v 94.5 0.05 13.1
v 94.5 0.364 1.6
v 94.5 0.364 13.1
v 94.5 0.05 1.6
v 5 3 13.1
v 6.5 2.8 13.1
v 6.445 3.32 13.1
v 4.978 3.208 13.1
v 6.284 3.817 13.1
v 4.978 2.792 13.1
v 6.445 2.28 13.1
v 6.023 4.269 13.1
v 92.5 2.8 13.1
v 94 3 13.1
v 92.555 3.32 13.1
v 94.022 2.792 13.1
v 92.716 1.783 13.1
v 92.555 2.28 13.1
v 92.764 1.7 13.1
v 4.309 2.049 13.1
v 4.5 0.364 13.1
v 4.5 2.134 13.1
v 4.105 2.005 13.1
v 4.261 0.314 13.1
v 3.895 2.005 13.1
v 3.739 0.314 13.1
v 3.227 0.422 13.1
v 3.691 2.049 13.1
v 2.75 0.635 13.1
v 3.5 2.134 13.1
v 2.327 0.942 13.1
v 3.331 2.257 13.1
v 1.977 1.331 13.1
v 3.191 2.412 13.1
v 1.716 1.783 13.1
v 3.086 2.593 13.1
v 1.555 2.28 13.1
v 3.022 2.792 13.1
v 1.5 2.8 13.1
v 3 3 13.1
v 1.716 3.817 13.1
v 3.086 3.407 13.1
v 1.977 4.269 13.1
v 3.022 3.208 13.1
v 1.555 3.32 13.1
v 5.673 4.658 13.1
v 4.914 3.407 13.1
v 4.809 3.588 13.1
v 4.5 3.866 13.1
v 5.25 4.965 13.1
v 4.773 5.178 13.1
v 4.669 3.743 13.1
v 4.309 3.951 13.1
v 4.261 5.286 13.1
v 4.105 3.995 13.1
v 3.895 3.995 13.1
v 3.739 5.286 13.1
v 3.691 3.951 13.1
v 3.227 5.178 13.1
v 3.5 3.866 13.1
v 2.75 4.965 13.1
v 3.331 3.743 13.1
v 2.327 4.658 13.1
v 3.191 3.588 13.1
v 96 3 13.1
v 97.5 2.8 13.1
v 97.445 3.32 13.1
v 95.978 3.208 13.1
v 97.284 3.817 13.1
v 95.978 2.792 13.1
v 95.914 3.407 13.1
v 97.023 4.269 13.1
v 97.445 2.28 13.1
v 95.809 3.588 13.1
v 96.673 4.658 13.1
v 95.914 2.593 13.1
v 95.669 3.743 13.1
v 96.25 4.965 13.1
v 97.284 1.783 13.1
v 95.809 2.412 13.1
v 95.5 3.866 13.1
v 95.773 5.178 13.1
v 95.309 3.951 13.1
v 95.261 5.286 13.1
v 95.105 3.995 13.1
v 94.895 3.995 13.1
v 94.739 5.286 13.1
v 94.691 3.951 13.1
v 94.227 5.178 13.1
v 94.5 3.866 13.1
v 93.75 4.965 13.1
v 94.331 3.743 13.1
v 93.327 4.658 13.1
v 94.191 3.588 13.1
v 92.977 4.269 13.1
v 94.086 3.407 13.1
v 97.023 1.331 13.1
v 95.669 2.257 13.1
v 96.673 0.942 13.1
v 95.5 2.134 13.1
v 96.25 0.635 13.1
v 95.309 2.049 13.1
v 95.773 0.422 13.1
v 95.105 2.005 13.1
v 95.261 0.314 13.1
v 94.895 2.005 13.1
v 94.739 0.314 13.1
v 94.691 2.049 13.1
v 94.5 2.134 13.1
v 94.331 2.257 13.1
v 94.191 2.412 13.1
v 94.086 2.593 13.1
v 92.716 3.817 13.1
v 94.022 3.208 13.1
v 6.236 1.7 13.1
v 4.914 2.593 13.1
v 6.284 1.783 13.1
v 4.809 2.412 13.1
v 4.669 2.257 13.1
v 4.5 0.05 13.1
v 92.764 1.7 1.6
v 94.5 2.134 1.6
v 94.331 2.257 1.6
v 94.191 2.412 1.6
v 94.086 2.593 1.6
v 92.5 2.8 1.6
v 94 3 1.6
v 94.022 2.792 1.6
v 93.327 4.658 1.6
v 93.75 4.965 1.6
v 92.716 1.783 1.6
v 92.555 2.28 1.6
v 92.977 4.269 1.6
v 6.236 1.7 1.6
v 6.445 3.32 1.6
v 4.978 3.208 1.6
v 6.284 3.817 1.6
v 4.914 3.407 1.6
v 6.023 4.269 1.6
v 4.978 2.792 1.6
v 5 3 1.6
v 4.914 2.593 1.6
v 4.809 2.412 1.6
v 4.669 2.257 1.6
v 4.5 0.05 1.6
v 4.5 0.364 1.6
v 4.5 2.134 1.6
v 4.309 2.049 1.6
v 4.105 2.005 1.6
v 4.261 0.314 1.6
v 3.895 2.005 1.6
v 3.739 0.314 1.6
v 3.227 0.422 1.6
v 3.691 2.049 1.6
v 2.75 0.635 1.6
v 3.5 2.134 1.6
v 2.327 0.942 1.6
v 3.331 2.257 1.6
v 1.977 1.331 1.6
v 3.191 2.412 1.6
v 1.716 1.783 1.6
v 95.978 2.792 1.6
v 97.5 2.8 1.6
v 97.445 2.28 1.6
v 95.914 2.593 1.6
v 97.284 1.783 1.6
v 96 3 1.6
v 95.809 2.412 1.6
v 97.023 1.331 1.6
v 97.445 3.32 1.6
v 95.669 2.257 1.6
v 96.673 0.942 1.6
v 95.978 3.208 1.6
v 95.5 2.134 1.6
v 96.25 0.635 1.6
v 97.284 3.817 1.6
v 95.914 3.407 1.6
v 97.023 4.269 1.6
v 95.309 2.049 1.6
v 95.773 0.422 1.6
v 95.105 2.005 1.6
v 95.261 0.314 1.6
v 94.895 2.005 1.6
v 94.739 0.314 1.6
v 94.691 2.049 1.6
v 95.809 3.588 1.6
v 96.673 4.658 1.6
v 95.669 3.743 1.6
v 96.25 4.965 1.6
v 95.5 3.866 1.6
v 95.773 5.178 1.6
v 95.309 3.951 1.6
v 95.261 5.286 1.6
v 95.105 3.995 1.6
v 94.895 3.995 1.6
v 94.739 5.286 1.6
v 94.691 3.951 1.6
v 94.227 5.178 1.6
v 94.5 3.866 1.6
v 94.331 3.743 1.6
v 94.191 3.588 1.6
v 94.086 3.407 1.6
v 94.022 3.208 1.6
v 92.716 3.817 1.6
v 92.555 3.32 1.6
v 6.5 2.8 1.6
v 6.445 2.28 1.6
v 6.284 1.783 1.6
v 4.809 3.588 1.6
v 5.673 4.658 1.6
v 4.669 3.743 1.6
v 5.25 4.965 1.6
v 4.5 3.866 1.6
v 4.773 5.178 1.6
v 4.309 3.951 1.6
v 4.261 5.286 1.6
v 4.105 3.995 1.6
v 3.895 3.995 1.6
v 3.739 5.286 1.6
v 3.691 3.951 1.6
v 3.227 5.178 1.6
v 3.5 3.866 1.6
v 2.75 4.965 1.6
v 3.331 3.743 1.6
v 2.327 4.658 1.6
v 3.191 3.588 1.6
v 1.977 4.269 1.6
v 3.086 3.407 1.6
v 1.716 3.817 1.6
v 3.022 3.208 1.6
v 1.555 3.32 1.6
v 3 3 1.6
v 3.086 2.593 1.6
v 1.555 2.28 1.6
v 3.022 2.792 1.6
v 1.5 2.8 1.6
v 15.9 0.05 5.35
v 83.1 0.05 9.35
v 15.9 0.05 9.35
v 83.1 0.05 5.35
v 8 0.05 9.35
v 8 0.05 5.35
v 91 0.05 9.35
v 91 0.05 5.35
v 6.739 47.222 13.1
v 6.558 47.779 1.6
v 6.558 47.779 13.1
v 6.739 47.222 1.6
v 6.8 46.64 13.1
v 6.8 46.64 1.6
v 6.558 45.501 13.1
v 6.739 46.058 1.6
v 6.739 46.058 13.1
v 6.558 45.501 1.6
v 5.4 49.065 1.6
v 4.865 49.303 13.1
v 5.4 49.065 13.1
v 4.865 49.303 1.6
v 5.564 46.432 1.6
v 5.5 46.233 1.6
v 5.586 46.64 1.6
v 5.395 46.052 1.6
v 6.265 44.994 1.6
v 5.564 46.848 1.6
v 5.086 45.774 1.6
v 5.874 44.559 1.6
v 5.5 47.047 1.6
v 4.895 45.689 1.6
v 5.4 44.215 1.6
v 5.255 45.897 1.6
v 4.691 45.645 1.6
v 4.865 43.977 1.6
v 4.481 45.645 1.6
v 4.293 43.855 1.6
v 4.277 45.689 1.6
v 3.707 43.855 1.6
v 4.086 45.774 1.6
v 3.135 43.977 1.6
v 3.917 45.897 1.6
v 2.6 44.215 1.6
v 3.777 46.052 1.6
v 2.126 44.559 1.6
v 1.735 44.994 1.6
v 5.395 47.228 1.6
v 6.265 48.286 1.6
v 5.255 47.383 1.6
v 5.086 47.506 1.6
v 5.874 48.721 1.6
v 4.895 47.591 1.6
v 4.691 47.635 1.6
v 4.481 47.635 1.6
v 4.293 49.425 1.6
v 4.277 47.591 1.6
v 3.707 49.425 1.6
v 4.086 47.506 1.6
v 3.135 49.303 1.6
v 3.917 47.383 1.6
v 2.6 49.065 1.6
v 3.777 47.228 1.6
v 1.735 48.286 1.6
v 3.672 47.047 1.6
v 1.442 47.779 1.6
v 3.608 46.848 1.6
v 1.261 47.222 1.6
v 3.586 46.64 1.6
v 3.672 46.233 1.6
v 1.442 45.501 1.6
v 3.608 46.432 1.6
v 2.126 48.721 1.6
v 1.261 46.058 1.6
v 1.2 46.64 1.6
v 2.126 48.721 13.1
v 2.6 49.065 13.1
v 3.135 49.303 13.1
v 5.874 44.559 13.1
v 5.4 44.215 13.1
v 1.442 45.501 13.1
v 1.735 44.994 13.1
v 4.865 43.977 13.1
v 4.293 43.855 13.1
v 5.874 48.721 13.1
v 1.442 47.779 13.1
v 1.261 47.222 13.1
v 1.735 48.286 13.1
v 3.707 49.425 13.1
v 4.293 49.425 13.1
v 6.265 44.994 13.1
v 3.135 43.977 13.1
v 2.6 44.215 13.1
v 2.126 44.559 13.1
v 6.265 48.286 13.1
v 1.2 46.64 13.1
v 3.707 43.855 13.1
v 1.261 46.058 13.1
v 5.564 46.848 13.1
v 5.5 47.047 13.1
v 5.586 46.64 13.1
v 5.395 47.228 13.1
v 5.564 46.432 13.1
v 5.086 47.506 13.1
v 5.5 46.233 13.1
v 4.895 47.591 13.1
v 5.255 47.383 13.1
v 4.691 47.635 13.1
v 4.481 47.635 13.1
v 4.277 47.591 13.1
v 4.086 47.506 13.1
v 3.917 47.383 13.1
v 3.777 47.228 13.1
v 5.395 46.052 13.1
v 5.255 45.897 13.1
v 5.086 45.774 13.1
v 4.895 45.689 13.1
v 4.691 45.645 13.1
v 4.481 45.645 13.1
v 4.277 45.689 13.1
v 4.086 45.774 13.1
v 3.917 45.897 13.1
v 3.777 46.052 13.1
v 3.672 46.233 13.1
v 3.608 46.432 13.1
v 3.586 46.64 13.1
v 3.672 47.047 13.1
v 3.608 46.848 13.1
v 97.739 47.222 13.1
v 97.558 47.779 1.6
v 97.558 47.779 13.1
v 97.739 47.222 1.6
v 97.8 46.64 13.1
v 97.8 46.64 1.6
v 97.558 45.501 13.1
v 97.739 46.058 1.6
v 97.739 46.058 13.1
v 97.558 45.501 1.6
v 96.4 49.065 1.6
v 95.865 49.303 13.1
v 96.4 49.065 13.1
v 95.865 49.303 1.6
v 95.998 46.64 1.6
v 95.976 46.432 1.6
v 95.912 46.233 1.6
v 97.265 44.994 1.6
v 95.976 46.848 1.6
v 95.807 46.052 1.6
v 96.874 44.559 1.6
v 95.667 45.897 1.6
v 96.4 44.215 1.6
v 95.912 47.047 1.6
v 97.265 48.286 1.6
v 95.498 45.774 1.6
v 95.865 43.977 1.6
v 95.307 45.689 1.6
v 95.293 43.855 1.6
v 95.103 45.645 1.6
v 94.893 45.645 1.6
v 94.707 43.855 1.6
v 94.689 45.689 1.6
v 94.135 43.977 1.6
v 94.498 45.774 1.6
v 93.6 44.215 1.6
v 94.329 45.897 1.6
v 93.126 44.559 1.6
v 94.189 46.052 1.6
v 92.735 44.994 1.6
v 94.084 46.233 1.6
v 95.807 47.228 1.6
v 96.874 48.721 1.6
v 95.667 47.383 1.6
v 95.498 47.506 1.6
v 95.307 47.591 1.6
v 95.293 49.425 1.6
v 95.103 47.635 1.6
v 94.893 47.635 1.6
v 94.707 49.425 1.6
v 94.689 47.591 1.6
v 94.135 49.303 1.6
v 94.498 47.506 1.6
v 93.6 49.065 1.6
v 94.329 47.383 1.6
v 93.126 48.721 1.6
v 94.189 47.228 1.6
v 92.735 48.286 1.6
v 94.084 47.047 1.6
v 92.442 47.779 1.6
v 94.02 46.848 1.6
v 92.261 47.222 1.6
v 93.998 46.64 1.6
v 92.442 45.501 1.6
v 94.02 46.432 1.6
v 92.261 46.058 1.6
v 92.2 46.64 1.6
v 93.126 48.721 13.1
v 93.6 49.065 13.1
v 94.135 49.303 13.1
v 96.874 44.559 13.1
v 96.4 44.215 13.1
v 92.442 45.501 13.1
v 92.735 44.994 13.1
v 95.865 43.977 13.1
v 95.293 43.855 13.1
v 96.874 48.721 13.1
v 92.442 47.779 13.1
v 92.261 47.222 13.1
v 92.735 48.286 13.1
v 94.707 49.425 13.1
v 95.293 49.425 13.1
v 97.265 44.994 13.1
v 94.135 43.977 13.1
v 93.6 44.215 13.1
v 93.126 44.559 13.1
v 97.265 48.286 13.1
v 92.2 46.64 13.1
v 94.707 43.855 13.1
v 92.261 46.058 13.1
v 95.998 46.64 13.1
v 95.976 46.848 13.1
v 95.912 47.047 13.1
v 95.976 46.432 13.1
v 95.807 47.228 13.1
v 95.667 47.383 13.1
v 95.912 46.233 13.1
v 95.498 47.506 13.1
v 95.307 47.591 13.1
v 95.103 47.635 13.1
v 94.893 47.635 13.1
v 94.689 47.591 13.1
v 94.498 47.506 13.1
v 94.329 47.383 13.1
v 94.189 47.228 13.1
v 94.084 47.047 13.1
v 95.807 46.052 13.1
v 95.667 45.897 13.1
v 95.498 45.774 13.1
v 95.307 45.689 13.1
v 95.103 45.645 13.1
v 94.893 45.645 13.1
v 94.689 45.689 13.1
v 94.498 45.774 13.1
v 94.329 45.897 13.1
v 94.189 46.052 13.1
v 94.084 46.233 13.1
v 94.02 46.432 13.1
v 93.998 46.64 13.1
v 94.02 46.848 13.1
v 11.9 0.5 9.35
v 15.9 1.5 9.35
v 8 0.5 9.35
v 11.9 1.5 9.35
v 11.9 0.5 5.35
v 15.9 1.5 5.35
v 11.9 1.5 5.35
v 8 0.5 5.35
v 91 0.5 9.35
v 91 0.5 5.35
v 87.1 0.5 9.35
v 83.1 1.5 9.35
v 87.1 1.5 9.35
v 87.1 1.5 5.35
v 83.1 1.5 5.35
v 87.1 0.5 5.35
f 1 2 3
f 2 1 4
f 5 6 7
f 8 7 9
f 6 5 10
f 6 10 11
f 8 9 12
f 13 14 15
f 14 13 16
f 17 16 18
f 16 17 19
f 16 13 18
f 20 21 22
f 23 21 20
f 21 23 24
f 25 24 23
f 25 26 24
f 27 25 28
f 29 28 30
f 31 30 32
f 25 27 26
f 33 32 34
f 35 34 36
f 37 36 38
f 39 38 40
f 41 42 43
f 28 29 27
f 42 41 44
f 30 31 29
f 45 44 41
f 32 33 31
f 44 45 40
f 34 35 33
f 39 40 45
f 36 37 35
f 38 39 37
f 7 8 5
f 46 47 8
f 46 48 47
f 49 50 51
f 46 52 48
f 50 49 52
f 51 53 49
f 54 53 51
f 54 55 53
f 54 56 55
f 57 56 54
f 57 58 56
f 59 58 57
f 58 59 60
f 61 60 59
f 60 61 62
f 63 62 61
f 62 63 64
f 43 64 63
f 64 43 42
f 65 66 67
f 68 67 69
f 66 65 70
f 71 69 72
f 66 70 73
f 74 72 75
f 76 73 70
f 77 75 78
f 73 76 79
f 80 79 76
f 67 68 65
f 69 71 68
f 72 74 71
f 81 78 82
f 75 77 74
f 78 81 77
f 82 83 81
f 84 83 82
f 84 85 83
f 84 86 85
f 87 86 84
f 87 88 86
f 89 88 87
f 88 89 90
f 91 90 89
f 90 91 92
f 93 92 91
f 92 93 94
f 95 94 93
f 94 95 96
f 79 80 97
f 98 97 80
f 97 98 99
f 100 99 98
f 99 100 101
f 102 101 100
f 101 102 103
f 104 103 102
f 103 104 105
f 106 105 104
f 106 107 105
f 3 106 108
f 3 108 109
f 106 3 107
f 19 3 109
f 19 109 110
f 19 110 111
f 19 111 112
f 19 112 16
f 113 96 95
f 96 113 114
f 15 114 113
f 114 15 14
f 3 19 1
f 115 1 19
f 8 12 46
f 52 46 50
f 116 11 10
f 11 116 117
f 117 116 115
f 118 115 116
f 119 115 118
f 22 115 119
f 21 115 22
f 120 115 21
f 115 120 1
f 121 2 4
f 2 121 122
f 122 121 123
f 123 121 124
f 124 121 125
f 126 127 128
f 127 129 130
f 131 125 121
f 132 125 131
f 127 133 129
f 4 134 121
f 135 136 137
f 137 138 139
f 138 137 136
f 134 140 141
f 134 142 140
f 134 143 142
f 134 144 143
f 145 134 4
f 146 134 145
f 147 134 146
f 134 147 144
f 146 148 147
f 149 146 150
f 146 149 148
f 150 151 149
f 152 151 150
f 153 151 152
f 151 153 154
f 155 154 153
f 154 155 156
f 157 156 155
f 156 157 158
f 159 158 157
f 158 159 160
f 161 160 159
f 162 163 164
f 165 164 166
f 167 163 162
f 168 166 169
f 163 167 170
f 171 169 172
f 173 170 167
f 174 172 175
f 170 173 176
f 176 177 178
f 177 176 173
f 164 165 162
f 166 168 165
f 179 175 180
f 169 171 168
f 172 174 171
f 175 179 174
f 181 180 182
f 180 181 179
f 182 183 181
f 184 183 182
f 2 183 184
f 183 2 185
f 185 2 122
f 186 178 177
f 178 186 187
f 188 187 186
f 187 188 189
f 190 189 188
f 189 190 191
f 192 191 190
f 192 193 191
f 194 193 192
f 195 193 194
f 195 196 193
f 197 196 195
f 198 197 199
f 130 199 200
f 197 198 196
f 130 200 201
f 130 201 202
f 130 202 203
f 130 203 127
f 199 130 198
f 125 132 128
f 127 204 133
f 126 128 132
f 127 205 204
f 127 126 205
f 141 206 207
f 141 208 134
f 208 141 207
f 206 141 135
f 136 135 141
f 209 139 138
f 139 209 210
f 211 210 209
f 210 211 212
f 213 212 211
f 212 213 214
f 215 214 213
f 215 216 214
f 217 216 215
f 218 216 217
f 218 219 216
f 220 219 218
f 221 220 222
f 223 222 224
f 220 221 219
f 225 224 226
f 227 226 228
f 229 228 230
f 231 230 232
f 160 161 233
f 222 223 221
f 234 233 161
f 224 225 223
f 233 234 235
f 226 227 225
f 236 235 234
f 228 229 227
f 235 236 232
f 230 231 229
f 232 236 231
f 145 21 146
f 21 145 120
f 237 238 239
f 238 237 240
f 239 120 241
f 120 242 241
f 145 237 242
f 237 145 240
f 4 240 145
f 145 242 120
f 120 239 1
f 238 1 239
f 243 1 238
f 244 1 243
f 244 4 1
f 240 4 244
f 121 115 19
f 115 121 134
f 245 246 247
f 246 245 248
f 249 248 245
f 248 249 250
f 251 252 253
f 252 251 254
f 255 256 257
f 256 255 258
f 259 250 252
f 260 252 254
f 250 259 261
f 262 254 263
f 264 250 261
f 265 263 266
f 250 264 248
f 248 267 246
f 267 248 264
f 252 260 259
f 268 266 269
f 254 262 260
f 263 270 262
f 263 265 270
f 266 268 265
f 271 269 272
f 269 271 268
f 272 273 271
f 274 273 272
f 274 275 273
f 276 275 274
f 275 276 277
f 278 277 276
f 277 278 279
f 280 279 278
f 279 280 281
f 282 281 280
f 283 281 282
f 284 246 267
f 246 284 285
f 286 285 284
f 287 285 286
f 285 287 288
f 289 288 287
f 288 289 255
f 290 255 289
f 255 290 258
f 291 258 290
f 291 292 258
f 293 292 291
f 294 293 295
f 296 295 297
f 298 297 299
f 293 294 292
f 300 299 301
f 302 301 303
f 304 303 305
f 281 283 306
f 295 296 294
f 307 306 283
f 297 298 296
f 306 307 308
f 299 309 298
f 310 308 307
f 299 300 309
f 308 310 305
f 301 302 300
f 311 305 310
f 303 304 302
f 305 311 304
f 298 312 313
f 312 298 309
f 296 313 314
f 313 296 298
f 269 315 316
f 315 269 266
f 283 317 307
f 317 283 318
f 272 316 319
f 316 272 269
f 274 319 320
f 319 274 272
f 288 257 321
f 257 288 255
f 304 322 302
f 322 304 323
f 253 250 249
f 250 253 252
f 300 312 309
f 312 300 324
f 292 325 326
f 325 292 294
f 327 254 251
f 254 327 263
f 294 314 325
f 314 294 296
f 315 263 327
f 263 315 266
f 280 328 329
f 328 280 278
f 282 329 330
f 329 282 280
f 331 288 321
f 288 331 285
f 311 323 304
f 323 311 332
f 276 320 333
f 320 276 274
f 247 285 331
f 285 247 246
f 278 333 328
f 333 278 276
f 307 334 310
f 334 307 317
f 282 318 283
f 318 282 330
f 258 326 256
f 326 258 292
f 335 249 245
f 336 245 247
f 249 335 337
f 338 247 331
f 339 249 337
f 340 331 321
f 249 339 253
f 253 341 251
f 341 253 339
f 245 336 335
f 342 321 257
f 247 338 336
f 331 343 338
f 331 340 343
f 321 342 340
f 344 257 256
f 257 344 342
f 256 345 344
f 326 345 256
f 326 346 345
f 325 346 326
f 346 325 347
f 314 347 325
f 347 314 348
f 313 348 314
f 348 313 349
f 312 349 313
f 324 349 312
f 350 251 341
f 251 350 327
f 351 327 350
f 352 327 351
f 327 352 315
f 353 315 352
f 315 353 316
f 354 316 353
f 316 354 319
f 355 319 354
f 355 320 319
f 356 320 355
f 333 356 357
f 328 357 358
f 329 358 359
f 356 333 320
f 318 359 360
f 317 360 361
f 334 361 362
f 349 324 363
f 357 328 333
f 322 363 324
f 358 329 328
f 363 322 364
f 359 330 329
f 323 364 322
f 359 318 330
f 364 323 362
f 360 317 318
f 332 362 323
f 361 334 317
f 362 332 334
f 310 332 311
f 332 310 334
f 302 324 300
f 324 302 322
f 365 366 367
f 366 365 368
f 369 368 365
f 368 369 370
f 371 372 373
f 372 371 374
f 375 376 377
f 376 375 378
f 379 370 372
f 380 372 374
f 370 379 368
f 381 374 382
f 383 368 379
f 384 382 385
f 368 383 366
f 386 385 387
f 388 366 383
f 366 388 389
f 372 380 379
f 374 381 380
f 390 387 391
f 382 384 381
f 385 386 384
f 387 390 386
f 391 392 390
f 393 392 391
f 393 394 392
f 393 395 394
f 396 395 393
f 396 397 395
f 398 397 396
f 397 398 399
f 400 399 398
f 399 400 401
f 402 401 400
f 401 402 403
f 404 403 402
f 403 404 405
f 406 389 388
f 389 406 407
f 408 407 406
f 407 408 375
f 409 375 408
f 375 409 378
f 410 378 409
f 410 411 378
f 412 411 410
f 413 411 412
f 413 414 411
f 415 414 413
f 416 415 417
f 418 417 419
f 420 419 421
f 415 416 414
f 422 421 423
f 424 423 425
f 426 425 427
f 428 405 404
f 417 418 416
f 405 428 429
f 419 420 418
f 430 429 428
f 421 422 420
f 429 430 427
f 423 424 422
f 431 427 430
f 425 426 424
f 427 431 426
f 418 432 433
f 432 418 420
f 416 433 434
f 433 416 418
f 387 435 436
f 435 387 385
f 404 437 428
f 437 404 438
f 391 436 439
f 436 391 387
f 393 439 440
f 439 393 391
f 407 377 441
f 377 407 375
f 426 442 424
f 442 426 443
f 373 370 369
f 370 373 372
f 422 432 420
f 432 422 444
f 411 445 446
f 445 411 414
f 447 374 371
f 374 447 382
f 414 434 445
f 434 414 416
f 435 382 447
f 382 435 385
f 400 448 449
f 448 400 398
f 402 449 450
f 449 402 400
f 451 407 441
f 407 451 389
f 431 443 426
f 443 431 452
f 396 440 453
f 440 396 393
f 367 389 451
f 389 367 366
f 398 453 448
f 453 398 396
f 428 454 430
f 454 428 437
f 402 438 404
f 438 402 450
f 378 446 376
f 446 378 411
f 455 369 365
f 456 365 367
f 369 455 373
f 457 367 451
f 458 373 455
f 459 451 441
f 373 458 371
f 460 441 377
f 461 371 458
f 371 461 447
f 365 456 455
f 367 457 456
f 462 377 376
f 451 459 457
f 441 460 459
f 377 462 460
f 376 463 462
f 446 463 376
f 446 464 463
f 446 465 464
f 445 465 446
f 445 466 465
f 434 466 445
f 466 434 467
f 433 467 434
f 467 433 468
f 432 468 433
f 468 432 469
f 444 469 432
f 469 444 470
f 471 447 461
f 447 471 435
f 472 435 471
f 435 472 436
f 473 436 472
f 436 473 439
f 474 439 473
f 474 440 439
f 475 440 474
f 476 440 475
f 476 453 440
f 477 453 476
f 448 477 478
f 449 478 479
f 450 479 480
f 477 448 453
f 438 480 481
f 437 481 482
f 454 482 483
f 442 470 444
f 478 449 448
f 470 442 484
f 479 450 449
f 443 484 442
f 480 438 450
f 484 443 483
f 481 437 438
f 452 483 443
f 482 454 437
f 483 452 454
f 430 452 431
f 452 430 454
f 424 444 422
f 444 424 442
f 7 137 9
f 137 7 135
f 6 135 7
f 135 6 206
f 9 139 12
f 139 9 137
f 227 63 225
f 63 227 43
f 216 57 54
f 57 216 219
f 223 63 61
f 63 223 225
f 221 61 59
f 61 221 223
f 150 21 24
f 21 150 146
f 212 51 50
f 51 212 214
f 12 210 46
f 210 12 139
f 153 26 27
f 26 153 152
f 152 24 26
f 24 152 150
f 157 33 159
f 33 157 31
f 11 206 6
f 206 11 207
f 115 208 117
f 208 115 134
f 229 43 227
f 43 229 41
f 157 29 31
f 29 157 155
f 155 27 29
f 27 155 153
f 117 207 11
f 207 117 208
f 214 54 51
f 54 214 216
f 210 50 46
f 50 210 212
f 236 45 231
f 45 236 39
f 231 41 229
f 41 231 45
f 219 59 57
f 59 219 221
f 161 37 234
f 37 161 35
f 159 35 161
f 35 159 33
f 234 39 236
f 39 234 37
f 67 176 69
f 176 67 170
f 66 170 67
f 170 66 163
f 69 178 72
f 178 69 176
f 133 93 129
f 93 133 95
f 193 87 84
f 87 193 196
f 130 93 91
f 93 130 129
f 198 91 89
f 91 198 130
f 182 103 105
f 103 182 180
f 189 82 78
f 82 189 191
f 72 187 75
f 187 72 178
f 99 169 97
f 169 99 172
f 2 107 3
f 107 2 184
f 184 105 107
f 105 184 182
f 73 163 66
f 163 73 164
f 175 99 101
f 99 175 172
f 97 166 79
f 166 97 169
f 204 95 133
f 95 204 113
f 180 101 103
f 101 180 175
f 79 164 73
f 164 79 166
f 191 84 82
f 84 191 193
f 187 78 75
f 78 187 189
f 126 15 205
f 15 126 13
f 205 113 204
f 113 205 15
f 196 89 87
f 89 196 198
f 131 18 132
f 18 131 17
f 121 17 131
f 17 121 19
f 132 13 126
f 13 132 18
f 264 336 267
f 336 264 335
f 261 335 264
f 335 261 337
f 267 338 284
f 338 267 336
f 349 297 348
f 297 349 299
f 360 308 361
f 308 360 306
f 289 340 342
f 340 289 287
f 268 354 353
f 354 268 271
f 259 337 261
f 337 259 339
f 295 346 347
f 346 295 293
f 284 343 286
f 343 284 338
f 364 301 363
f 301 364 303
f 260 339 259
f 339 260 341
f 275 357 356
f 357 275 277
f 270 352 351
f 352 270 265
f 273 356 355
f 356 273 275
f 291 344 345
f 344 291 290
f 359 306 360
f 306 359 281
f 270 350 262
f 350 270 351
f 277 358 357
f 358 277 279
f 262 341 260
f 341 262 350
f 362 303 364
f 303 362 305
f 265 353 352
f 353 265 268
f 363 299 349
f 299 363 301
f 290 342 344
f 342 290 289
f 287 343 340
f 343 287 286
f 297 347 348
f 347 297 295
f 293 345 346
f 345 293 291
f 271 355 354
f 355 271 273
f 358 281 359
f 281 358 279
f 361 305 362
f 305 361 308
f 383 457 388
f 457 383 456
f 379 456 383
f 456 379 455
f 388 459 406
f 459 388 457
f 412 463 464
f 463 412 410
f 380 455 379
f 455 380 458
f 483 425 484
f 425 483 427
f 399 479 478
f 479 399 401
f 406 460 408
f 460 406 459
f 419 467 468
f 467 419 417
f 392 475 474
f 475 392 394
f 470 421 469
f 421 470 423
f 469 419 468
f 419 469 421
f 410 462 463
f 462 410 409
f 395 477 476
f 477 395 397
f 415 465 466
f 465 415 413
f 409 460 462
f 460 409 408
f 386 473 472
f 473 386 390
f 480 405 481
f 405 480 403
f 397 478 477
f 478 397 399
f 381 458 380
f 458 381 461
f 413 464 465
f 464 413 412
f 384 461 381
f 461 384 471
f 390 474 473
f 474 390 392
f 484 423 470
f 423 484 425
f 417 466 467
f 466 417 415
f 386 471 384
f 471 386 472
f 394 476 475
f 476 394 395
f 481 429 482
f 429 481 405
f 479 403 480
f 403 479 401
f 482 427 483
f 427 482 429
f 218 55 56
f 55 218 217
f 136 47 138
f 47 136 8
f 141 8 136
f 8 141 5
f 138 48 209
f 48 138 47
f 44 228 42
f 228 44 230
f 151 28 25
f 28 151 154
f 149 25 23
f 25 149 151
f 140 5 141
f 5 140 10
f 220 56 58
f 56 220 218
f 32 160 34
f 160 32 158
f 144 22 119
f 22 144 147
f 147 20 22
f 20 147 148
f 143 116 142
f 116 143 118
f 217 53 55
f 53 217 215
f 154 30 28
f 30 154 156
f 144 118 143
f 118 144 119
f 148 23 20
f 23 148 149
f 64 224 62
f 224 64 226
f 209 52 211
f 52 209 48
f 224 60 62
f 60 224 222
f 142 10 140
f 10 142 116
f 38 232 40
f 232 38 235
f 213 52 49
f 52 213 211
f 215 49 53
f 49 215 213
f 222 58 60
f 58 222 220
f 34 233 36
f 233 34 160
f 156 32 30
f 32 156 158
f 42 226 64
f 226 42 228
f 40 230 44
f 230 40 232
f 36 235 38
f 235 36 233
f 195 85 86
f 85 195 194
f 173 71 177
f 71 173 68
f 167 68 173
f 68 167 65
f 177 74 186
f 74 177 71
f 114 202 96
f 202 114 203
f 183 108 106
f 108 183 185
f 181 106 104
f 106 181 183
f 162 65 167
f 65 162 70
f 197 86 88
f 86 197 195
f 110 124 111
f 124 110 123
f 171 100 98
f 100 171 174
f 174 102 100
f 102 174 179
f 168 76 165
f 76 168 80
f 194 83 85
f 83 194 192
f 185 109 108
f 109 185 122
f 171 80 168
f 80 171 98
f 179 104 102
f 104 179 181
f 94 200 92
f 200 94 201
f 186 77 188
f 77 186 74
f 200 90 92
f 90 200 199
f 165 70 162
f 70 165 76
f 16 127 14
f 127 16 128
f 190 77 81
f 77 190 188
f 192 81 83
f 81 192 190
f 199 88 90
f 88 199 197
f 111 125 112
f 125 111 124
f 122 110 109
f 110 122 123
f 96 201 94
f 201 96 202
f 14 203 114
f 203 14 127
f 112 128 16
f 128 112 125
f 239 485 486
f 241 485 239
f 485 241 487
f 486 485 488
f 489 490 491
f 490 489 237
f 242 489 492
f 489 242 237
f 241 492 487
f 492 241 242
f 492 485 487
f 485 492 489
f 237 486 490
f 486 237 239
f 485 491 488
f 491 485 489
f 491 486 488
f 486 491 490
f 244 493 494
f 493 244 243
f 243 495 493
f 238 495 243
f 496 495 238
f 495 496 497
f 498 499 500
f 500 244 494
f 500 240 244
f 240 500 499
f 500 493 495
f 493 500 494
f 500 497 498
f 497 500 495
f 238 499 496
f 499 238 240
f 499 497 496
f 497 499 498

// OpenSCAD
////// MixTape 3d Printed Case///////////////////////////

// thanks for adding the wall thickness, Philip!

// 

plugHeight = 10.6; // [6:11]
tapeHeight = 11.5; //
topThickness = 1.6; 
screwHoleSize = 1;

bottom_wall_thickness = 2;

usb_charger = false;
cutout_aux_ports = false;

//rotate([55,0,$t*380]) translate([-50,0,0]){
rotate([0,0,0]) translate([0,0,0]){
//PCB();
//parts();

difference(){
    
    union(){
        //tapeBody();
        //tapeTop();
        FullCase();
    }
    
    // Plugs 
    translate([2.5,50,tapeHeight-plugHeight+topThickness]) cube([13,20,plugHeight+1],false); 
    translate([83.5,50,tapeHeight-plugHeight+topThickness]) cube([13,20,plugHeight+1],false);
    
    // write protectors 
    translate([10,0,0.5*tapeHeight+1.6]) cube([4,1,4],true);
    translate([13.9,0,0.5*tapeHeight+1.6]) cube([4,3,4],true);
    translate([89,0,0.5*tapeHeight+1.6]) cube([4,1,4],true);
    translate([85.1,0,0.5*tapeHeight+1.6]) cube([4,3,4],true);

    // Power signs
    //if (!usb_charger) {
    //    translate([41,0,0.5*tapeHeight+1.6]) cube([4,1.5,1],true);
    //    translate([41,0,0.5*tapeHeight+1.6]) cube([1,1.5,4],true);
    
    //    translate([58,0,0.5*tapeHeight+1.6]) cube([4,1.5,1],true); 
    //}
}
}


module FullCase(){
    
    difference(){
        tapeBody();
        screwHolebtop();
        screwHolebottom();
        speakerHole();
    }
    
    difference(){
        tapeTop();
        screwHolebtopcover();
        screwHolebtop();
        screwHolebottom();
    }    
   


// Modules ///////////////////////////////


module speakerHole(){   
    translate([0,18,tapeHeight/2 + topThickness])    
    for(z=[-180:45:+180])
      for(x=[4:3:12])
        rotate([90,z,90]) translate([x*0.45,0,0]) cylinder(h=10, r=0.4, $fn=30);
}
    
}


// Modules ///////////////////////////////

module PCB(){
color("DarkKhaki") 
translate ([0,0,tapeHeight+1.6]) linear_extrude(height = 1.6, center = false, convexity = 10, twist = 0) import("mixtape_case_3D_bottom.dxf", convexity=3);
color("Gold") 
translate ([0,0,tapeHeight+3.2]) linear_extrude(height = 0.2, center = false, convexity = 10, twist = 0) import("mixtape_case_3D_PCB.dxf", convexity=3);

color("DarkKhaki") 
translate ([0,0,tapeHeight+2*topThickness]) linear_extrude(height = 1.6, center = false, convexity = 10, twist = 0) import("mixtape_case_3D_PCB_TrapezBoard.dxf", convexity=3);
color("Gold") 
translate ([0,0,tapeHeight+3*topThickness]) linear_extrude(height = 0.2, center = false, convexity = 10, twist = 0) import("mixtape_case_3D_PCB_TrapezCircuit.dxf", convexity=3);
}

module tapeBody(){ 
    difference(){
        union(){
            difference(){ 
                //color("Deeppink") 
                translate ([0,0,1.6]) linear_extrude(height = tapeHeight, center = false, convexity = 10, twist = 0) import("mixtape_case_3D_bottom.dxf", convexity=3);  

                //if (!usb_charger) {
                    //translate ([0,0,0.6]) linear_extrude(height = tapeHeight+4, center = false, convexity = 10, twist = 0) import("mixtape_case_3D_MainCase.dxf", convexity=3);
                //} else {
                    //translate ([0,0,0.6]) linear_extrude(height = tapeHeight+4, center = false, convexity = 10, twist = 0) import("mixtape_case_3D_MainCase_USB.dxf", convexity=3);
                //}
      
                //Face holes
                translate([25,64,0.5*tapeHeight+topThickness]) cube([12,2,0.7*tapeHeight],true);
                if (!usb_charger) { 
                    translate([49.5,64,0.5*tapeHeight+topThickness]) cube([16,2,0.7*tapeHeight],true); 
                }
                translate([74.3,64,0.5*tapeHeight+topThickness]) cube([12,2,0.7*tapeHeight],true);

                translate([36,65,0.5*tapeHeight+topThickness]) cube([4,2,0.7*tapeHeight],true);
                translate([63,65,0.5*tapeHeight+topThickness]) cube([4,2,0.7*tapeHeight],true);

                if (usb_charger) {
                    // cutout usb port
                    translate([49.5,64,0.5*tapeHeight+topThickness+3])cube([20,14,0.7*tapeHeight+4],true);
                }


                if (cutout_aux_ports) {
                    translate([1.5,23,0.5*tapeHeight+topThickness+3]) cube([20,12,tapeHeight],true);
                    translate([90,23,0.5*tapeHeight+topThickness+3]) cube([20,12,tapeHeight],true);      
                }
            }
            translate([49.5,7.05,0.5*tapeHeight+topThickness]) cube([90,14,1*tapeHeight],true);
        } //end union
        
        
    // wall thickness
        translate([49.5,22.5+bottom_wall_thickness,0.5*tapeHeight+topThickness-1]) cube([93,45.6,1*tapeHeight+7],true);
        translate([49.5,40+bottom_wall_thickness+2.8,0.5*tapeHeight+topThickness-1]) cube([65,35,0.7*tapeHeight+7],true);
    } // end difference
    //color("DarkKhaki") 
    if (!usb_charger) {
    //translate([40,0.05,1.6]) cube([20,10,2.5],false);
    }
    
    //screw left
  translate([4 - 0 , 46.640 + 0, tapeHeight+topThickness-(tapeHeight)   ]) cylinder(h=tapeHeight*1, r=2.8, center=false, ,$fn=30);   
  translate([95 - 0 , 46.640 + 0, tapeHeight+topThickness-(tapeHeight)   ]) cylinder(h=tapeHeight*1, r=2.8, center=false, ,$fn=30); 
  translate([4 - 0 , 2.80 + 0, tapeHeight+topThickness-(tapeHeight)   ]) cylinder(h=tapeHeight*1, r=2.5, center=false, ,$fn=30);   
  translate([95 - 0 , 2.80 + 0, tapeHeight+topThickness-(tapeHeight)   ]) cylinder(h=tapeHeight*1, r=2.5, center=false, ,$fn=30); 
}


module screwHolebottom(){
  translate([4 - 0 , 3 + 0, 0  ]) cylinder(h=tapeHeight*4.1, r=screwHoleSize, center=true, ,$fn=30);
  translate([95 - 0 , 3 + 0, 0  ]) cylinder(h=tapeHeight*4.1, r=screwHoleSize, center=true, ,$fn=30);
}

module screwHolebtop(){
  //screw left
  translate([4.586 - 0 , 46.640 + 0, 0  ]) cylinder(h=11*4.1, r=screwHoleSize, center=true, ,$fn=30);
  //screw right
  translate([94.998 - 0 , 46.640 + 0, 0  ]) cylinder(h=11*4.1, r=screwHoleSize, center=true, ,$fn=30);
}


module screwHolebtopcover(){   
  //screw top left
  translate([4.586 - 0 , 46.640 + 0, 0+0-(0) - 0.0  ]) cylinder(h=topThickness*0.5, r=1.8, center=true, ,$fn=30);
  //screw top right
  translate([94.998 - 0 , 46.640 + 0, 0 - 0.0  ]) cylinder(h=topThickness*0.5, r=1.8, center=true, ,$fn=30); 

  //screw lower left
  translate([4 - 0 , 3 + 0, 0+0-(0) - 0.0  ]) cylinder(h=topThickness*0.5, r=1.8, center=true, ,$fn=30);
  //screw lower right
  translate([95 - 0 , 3 + 0, 0 - 0.0  ]) cylinder(h=topThickness*0.5, r=1.8, center=true, ,$fn=30);     
    
}


module tapeTop(){ 
 
difference(){ 
 color("Deeppink") 
     translate ([0,0,-1.5]) linear_extrude(height = 1.5, center = false, convexity = 10, twist = 0) import("mixtape_case_3D_TopTrapez.dxf", convexity=3);
     
   color("Gold") 
     translate ([0,0,-2.2]) linear_extrude(height = 3, center = false, convexity = 10, twist = 0) import("mixtape_case_3D_Holes.dxf", convexity=3);
   translate([50,53,-2.2]) cylinder(h=1.2, r=1.3, center=false, ,$fn=30);
}   
    

difference(){    
  color("Deeppink") 
     translate ([0,0,0]) linear_extrude(height = 1.6, center = false, convexity = 10, twist = 0) import("mixtape_case_3D_bottom.dxf", convexity=3);

  translate([4,3,-1]) cylinder(h=1.5, r=1.3, center=false, ,$fn=30);
  translate([95,3,-1]) cylinder(h=1.5, r=1.3, center=false, ,$fn=30);
  translate([4,61,-1]) cylinder(h=1.5, r=1.3, center=false, ,$fn=30);
  translate([95,61,-1]) cylinder(h=1.5, r=1.3, center=false, ,$fn=30);
    
  color("Pink") 
     translate ([0,0,-1.3]) linear_extrude(height = 2, center = false, convexity = 10, twist = 0) import("mixtape_case_3D_WindowRect.dxf", convexity=3); 
    
  difference(){    
  color("Gold") 
     translate ([0,0,-0.5]) linear_extrude(height = 1, center = false, convexity = 10, twist = 0) import("mixtape_case_3D_BigRect.dxf", convexity=3);  
  

  translate ([0,0,-3]) linear_extrude(height = 10, center = false, convexity = 10, twist = 0) import("mixtape_case_3D_MidRect.dxf", convexity=3);   
  }
  
  translate ([0,0,-3]) linear_extrude(height = 5.5, center = false, convexity = 10, twist = 0) import("mixtape_case_3D_Wheels.dxf", convexity=3); 
}

  translate ([0,0,0.4]) linear_extrude(height = 1.2, center = false, convexity = 10, twist = 0) import("mixtape_case_3D_NutWheels.dxf", convexity=3); 

}
 

module parts(){
    // IC-Socket
  color("Grey")
      translate([44,22.5,tapeHeight+2*topThickness]) cube([11,13,4],false);
    
  difference(){
  color("Black")
      translate([45,23.5,tapeHeight+2*topThickness]) cube([9,11,7],false);
        
    translate([49.5,34.5,tapeHeight+2*topThickness+6]) cylinder(h=10, r=1.5, center=false, ,$fn=30);
    }
    
    // NEO-Pixels
    for (a = [ 0 : 6.3 : 46 ])
    translate([a,0,0]) NEOpixel();
    
    module NEOpixel(){
    color("White")
      translate([25.2,52.5,tapeHeight+3*topThickness]) cube([5,5,2],false);
        
    color("Deeppink")
      translate([27.7,55,tapeHeight+3*topThickness]) cylinder(h=2.5, r=2, center=false, ,$fn=30);
    }
    
    // Pots
    potentiometer();
    translate ([42,0,0]) potentiometer();
    
    module potentiometer(){
    color("Grey")
      translate([29,29,tapeHeight+2*topThickness]) cylinder(h=10, r=3.5, center=false, ,$fn=30);
    
    color("Deeppink")
        translate([29,29,tapeHeight+2*topThickness+2]) cylinder(h=12, r1=6, r2=4.5, center=false, ,$fn=30);
    }
    
    // Buttons
    button();
    translate ([58,0,0]) button();
    
    module button(){
    color("Grey")
      translate([17.5,9.8,tapeHeight+2*topThickness]) cube([6,6,3],false);
        
    color("Red")
      translate([20.5,12.8,tapeHeight+2*topThickness]) cylinder(h=5, r=1.5, center=false, ,$fn=30);
    }

}
